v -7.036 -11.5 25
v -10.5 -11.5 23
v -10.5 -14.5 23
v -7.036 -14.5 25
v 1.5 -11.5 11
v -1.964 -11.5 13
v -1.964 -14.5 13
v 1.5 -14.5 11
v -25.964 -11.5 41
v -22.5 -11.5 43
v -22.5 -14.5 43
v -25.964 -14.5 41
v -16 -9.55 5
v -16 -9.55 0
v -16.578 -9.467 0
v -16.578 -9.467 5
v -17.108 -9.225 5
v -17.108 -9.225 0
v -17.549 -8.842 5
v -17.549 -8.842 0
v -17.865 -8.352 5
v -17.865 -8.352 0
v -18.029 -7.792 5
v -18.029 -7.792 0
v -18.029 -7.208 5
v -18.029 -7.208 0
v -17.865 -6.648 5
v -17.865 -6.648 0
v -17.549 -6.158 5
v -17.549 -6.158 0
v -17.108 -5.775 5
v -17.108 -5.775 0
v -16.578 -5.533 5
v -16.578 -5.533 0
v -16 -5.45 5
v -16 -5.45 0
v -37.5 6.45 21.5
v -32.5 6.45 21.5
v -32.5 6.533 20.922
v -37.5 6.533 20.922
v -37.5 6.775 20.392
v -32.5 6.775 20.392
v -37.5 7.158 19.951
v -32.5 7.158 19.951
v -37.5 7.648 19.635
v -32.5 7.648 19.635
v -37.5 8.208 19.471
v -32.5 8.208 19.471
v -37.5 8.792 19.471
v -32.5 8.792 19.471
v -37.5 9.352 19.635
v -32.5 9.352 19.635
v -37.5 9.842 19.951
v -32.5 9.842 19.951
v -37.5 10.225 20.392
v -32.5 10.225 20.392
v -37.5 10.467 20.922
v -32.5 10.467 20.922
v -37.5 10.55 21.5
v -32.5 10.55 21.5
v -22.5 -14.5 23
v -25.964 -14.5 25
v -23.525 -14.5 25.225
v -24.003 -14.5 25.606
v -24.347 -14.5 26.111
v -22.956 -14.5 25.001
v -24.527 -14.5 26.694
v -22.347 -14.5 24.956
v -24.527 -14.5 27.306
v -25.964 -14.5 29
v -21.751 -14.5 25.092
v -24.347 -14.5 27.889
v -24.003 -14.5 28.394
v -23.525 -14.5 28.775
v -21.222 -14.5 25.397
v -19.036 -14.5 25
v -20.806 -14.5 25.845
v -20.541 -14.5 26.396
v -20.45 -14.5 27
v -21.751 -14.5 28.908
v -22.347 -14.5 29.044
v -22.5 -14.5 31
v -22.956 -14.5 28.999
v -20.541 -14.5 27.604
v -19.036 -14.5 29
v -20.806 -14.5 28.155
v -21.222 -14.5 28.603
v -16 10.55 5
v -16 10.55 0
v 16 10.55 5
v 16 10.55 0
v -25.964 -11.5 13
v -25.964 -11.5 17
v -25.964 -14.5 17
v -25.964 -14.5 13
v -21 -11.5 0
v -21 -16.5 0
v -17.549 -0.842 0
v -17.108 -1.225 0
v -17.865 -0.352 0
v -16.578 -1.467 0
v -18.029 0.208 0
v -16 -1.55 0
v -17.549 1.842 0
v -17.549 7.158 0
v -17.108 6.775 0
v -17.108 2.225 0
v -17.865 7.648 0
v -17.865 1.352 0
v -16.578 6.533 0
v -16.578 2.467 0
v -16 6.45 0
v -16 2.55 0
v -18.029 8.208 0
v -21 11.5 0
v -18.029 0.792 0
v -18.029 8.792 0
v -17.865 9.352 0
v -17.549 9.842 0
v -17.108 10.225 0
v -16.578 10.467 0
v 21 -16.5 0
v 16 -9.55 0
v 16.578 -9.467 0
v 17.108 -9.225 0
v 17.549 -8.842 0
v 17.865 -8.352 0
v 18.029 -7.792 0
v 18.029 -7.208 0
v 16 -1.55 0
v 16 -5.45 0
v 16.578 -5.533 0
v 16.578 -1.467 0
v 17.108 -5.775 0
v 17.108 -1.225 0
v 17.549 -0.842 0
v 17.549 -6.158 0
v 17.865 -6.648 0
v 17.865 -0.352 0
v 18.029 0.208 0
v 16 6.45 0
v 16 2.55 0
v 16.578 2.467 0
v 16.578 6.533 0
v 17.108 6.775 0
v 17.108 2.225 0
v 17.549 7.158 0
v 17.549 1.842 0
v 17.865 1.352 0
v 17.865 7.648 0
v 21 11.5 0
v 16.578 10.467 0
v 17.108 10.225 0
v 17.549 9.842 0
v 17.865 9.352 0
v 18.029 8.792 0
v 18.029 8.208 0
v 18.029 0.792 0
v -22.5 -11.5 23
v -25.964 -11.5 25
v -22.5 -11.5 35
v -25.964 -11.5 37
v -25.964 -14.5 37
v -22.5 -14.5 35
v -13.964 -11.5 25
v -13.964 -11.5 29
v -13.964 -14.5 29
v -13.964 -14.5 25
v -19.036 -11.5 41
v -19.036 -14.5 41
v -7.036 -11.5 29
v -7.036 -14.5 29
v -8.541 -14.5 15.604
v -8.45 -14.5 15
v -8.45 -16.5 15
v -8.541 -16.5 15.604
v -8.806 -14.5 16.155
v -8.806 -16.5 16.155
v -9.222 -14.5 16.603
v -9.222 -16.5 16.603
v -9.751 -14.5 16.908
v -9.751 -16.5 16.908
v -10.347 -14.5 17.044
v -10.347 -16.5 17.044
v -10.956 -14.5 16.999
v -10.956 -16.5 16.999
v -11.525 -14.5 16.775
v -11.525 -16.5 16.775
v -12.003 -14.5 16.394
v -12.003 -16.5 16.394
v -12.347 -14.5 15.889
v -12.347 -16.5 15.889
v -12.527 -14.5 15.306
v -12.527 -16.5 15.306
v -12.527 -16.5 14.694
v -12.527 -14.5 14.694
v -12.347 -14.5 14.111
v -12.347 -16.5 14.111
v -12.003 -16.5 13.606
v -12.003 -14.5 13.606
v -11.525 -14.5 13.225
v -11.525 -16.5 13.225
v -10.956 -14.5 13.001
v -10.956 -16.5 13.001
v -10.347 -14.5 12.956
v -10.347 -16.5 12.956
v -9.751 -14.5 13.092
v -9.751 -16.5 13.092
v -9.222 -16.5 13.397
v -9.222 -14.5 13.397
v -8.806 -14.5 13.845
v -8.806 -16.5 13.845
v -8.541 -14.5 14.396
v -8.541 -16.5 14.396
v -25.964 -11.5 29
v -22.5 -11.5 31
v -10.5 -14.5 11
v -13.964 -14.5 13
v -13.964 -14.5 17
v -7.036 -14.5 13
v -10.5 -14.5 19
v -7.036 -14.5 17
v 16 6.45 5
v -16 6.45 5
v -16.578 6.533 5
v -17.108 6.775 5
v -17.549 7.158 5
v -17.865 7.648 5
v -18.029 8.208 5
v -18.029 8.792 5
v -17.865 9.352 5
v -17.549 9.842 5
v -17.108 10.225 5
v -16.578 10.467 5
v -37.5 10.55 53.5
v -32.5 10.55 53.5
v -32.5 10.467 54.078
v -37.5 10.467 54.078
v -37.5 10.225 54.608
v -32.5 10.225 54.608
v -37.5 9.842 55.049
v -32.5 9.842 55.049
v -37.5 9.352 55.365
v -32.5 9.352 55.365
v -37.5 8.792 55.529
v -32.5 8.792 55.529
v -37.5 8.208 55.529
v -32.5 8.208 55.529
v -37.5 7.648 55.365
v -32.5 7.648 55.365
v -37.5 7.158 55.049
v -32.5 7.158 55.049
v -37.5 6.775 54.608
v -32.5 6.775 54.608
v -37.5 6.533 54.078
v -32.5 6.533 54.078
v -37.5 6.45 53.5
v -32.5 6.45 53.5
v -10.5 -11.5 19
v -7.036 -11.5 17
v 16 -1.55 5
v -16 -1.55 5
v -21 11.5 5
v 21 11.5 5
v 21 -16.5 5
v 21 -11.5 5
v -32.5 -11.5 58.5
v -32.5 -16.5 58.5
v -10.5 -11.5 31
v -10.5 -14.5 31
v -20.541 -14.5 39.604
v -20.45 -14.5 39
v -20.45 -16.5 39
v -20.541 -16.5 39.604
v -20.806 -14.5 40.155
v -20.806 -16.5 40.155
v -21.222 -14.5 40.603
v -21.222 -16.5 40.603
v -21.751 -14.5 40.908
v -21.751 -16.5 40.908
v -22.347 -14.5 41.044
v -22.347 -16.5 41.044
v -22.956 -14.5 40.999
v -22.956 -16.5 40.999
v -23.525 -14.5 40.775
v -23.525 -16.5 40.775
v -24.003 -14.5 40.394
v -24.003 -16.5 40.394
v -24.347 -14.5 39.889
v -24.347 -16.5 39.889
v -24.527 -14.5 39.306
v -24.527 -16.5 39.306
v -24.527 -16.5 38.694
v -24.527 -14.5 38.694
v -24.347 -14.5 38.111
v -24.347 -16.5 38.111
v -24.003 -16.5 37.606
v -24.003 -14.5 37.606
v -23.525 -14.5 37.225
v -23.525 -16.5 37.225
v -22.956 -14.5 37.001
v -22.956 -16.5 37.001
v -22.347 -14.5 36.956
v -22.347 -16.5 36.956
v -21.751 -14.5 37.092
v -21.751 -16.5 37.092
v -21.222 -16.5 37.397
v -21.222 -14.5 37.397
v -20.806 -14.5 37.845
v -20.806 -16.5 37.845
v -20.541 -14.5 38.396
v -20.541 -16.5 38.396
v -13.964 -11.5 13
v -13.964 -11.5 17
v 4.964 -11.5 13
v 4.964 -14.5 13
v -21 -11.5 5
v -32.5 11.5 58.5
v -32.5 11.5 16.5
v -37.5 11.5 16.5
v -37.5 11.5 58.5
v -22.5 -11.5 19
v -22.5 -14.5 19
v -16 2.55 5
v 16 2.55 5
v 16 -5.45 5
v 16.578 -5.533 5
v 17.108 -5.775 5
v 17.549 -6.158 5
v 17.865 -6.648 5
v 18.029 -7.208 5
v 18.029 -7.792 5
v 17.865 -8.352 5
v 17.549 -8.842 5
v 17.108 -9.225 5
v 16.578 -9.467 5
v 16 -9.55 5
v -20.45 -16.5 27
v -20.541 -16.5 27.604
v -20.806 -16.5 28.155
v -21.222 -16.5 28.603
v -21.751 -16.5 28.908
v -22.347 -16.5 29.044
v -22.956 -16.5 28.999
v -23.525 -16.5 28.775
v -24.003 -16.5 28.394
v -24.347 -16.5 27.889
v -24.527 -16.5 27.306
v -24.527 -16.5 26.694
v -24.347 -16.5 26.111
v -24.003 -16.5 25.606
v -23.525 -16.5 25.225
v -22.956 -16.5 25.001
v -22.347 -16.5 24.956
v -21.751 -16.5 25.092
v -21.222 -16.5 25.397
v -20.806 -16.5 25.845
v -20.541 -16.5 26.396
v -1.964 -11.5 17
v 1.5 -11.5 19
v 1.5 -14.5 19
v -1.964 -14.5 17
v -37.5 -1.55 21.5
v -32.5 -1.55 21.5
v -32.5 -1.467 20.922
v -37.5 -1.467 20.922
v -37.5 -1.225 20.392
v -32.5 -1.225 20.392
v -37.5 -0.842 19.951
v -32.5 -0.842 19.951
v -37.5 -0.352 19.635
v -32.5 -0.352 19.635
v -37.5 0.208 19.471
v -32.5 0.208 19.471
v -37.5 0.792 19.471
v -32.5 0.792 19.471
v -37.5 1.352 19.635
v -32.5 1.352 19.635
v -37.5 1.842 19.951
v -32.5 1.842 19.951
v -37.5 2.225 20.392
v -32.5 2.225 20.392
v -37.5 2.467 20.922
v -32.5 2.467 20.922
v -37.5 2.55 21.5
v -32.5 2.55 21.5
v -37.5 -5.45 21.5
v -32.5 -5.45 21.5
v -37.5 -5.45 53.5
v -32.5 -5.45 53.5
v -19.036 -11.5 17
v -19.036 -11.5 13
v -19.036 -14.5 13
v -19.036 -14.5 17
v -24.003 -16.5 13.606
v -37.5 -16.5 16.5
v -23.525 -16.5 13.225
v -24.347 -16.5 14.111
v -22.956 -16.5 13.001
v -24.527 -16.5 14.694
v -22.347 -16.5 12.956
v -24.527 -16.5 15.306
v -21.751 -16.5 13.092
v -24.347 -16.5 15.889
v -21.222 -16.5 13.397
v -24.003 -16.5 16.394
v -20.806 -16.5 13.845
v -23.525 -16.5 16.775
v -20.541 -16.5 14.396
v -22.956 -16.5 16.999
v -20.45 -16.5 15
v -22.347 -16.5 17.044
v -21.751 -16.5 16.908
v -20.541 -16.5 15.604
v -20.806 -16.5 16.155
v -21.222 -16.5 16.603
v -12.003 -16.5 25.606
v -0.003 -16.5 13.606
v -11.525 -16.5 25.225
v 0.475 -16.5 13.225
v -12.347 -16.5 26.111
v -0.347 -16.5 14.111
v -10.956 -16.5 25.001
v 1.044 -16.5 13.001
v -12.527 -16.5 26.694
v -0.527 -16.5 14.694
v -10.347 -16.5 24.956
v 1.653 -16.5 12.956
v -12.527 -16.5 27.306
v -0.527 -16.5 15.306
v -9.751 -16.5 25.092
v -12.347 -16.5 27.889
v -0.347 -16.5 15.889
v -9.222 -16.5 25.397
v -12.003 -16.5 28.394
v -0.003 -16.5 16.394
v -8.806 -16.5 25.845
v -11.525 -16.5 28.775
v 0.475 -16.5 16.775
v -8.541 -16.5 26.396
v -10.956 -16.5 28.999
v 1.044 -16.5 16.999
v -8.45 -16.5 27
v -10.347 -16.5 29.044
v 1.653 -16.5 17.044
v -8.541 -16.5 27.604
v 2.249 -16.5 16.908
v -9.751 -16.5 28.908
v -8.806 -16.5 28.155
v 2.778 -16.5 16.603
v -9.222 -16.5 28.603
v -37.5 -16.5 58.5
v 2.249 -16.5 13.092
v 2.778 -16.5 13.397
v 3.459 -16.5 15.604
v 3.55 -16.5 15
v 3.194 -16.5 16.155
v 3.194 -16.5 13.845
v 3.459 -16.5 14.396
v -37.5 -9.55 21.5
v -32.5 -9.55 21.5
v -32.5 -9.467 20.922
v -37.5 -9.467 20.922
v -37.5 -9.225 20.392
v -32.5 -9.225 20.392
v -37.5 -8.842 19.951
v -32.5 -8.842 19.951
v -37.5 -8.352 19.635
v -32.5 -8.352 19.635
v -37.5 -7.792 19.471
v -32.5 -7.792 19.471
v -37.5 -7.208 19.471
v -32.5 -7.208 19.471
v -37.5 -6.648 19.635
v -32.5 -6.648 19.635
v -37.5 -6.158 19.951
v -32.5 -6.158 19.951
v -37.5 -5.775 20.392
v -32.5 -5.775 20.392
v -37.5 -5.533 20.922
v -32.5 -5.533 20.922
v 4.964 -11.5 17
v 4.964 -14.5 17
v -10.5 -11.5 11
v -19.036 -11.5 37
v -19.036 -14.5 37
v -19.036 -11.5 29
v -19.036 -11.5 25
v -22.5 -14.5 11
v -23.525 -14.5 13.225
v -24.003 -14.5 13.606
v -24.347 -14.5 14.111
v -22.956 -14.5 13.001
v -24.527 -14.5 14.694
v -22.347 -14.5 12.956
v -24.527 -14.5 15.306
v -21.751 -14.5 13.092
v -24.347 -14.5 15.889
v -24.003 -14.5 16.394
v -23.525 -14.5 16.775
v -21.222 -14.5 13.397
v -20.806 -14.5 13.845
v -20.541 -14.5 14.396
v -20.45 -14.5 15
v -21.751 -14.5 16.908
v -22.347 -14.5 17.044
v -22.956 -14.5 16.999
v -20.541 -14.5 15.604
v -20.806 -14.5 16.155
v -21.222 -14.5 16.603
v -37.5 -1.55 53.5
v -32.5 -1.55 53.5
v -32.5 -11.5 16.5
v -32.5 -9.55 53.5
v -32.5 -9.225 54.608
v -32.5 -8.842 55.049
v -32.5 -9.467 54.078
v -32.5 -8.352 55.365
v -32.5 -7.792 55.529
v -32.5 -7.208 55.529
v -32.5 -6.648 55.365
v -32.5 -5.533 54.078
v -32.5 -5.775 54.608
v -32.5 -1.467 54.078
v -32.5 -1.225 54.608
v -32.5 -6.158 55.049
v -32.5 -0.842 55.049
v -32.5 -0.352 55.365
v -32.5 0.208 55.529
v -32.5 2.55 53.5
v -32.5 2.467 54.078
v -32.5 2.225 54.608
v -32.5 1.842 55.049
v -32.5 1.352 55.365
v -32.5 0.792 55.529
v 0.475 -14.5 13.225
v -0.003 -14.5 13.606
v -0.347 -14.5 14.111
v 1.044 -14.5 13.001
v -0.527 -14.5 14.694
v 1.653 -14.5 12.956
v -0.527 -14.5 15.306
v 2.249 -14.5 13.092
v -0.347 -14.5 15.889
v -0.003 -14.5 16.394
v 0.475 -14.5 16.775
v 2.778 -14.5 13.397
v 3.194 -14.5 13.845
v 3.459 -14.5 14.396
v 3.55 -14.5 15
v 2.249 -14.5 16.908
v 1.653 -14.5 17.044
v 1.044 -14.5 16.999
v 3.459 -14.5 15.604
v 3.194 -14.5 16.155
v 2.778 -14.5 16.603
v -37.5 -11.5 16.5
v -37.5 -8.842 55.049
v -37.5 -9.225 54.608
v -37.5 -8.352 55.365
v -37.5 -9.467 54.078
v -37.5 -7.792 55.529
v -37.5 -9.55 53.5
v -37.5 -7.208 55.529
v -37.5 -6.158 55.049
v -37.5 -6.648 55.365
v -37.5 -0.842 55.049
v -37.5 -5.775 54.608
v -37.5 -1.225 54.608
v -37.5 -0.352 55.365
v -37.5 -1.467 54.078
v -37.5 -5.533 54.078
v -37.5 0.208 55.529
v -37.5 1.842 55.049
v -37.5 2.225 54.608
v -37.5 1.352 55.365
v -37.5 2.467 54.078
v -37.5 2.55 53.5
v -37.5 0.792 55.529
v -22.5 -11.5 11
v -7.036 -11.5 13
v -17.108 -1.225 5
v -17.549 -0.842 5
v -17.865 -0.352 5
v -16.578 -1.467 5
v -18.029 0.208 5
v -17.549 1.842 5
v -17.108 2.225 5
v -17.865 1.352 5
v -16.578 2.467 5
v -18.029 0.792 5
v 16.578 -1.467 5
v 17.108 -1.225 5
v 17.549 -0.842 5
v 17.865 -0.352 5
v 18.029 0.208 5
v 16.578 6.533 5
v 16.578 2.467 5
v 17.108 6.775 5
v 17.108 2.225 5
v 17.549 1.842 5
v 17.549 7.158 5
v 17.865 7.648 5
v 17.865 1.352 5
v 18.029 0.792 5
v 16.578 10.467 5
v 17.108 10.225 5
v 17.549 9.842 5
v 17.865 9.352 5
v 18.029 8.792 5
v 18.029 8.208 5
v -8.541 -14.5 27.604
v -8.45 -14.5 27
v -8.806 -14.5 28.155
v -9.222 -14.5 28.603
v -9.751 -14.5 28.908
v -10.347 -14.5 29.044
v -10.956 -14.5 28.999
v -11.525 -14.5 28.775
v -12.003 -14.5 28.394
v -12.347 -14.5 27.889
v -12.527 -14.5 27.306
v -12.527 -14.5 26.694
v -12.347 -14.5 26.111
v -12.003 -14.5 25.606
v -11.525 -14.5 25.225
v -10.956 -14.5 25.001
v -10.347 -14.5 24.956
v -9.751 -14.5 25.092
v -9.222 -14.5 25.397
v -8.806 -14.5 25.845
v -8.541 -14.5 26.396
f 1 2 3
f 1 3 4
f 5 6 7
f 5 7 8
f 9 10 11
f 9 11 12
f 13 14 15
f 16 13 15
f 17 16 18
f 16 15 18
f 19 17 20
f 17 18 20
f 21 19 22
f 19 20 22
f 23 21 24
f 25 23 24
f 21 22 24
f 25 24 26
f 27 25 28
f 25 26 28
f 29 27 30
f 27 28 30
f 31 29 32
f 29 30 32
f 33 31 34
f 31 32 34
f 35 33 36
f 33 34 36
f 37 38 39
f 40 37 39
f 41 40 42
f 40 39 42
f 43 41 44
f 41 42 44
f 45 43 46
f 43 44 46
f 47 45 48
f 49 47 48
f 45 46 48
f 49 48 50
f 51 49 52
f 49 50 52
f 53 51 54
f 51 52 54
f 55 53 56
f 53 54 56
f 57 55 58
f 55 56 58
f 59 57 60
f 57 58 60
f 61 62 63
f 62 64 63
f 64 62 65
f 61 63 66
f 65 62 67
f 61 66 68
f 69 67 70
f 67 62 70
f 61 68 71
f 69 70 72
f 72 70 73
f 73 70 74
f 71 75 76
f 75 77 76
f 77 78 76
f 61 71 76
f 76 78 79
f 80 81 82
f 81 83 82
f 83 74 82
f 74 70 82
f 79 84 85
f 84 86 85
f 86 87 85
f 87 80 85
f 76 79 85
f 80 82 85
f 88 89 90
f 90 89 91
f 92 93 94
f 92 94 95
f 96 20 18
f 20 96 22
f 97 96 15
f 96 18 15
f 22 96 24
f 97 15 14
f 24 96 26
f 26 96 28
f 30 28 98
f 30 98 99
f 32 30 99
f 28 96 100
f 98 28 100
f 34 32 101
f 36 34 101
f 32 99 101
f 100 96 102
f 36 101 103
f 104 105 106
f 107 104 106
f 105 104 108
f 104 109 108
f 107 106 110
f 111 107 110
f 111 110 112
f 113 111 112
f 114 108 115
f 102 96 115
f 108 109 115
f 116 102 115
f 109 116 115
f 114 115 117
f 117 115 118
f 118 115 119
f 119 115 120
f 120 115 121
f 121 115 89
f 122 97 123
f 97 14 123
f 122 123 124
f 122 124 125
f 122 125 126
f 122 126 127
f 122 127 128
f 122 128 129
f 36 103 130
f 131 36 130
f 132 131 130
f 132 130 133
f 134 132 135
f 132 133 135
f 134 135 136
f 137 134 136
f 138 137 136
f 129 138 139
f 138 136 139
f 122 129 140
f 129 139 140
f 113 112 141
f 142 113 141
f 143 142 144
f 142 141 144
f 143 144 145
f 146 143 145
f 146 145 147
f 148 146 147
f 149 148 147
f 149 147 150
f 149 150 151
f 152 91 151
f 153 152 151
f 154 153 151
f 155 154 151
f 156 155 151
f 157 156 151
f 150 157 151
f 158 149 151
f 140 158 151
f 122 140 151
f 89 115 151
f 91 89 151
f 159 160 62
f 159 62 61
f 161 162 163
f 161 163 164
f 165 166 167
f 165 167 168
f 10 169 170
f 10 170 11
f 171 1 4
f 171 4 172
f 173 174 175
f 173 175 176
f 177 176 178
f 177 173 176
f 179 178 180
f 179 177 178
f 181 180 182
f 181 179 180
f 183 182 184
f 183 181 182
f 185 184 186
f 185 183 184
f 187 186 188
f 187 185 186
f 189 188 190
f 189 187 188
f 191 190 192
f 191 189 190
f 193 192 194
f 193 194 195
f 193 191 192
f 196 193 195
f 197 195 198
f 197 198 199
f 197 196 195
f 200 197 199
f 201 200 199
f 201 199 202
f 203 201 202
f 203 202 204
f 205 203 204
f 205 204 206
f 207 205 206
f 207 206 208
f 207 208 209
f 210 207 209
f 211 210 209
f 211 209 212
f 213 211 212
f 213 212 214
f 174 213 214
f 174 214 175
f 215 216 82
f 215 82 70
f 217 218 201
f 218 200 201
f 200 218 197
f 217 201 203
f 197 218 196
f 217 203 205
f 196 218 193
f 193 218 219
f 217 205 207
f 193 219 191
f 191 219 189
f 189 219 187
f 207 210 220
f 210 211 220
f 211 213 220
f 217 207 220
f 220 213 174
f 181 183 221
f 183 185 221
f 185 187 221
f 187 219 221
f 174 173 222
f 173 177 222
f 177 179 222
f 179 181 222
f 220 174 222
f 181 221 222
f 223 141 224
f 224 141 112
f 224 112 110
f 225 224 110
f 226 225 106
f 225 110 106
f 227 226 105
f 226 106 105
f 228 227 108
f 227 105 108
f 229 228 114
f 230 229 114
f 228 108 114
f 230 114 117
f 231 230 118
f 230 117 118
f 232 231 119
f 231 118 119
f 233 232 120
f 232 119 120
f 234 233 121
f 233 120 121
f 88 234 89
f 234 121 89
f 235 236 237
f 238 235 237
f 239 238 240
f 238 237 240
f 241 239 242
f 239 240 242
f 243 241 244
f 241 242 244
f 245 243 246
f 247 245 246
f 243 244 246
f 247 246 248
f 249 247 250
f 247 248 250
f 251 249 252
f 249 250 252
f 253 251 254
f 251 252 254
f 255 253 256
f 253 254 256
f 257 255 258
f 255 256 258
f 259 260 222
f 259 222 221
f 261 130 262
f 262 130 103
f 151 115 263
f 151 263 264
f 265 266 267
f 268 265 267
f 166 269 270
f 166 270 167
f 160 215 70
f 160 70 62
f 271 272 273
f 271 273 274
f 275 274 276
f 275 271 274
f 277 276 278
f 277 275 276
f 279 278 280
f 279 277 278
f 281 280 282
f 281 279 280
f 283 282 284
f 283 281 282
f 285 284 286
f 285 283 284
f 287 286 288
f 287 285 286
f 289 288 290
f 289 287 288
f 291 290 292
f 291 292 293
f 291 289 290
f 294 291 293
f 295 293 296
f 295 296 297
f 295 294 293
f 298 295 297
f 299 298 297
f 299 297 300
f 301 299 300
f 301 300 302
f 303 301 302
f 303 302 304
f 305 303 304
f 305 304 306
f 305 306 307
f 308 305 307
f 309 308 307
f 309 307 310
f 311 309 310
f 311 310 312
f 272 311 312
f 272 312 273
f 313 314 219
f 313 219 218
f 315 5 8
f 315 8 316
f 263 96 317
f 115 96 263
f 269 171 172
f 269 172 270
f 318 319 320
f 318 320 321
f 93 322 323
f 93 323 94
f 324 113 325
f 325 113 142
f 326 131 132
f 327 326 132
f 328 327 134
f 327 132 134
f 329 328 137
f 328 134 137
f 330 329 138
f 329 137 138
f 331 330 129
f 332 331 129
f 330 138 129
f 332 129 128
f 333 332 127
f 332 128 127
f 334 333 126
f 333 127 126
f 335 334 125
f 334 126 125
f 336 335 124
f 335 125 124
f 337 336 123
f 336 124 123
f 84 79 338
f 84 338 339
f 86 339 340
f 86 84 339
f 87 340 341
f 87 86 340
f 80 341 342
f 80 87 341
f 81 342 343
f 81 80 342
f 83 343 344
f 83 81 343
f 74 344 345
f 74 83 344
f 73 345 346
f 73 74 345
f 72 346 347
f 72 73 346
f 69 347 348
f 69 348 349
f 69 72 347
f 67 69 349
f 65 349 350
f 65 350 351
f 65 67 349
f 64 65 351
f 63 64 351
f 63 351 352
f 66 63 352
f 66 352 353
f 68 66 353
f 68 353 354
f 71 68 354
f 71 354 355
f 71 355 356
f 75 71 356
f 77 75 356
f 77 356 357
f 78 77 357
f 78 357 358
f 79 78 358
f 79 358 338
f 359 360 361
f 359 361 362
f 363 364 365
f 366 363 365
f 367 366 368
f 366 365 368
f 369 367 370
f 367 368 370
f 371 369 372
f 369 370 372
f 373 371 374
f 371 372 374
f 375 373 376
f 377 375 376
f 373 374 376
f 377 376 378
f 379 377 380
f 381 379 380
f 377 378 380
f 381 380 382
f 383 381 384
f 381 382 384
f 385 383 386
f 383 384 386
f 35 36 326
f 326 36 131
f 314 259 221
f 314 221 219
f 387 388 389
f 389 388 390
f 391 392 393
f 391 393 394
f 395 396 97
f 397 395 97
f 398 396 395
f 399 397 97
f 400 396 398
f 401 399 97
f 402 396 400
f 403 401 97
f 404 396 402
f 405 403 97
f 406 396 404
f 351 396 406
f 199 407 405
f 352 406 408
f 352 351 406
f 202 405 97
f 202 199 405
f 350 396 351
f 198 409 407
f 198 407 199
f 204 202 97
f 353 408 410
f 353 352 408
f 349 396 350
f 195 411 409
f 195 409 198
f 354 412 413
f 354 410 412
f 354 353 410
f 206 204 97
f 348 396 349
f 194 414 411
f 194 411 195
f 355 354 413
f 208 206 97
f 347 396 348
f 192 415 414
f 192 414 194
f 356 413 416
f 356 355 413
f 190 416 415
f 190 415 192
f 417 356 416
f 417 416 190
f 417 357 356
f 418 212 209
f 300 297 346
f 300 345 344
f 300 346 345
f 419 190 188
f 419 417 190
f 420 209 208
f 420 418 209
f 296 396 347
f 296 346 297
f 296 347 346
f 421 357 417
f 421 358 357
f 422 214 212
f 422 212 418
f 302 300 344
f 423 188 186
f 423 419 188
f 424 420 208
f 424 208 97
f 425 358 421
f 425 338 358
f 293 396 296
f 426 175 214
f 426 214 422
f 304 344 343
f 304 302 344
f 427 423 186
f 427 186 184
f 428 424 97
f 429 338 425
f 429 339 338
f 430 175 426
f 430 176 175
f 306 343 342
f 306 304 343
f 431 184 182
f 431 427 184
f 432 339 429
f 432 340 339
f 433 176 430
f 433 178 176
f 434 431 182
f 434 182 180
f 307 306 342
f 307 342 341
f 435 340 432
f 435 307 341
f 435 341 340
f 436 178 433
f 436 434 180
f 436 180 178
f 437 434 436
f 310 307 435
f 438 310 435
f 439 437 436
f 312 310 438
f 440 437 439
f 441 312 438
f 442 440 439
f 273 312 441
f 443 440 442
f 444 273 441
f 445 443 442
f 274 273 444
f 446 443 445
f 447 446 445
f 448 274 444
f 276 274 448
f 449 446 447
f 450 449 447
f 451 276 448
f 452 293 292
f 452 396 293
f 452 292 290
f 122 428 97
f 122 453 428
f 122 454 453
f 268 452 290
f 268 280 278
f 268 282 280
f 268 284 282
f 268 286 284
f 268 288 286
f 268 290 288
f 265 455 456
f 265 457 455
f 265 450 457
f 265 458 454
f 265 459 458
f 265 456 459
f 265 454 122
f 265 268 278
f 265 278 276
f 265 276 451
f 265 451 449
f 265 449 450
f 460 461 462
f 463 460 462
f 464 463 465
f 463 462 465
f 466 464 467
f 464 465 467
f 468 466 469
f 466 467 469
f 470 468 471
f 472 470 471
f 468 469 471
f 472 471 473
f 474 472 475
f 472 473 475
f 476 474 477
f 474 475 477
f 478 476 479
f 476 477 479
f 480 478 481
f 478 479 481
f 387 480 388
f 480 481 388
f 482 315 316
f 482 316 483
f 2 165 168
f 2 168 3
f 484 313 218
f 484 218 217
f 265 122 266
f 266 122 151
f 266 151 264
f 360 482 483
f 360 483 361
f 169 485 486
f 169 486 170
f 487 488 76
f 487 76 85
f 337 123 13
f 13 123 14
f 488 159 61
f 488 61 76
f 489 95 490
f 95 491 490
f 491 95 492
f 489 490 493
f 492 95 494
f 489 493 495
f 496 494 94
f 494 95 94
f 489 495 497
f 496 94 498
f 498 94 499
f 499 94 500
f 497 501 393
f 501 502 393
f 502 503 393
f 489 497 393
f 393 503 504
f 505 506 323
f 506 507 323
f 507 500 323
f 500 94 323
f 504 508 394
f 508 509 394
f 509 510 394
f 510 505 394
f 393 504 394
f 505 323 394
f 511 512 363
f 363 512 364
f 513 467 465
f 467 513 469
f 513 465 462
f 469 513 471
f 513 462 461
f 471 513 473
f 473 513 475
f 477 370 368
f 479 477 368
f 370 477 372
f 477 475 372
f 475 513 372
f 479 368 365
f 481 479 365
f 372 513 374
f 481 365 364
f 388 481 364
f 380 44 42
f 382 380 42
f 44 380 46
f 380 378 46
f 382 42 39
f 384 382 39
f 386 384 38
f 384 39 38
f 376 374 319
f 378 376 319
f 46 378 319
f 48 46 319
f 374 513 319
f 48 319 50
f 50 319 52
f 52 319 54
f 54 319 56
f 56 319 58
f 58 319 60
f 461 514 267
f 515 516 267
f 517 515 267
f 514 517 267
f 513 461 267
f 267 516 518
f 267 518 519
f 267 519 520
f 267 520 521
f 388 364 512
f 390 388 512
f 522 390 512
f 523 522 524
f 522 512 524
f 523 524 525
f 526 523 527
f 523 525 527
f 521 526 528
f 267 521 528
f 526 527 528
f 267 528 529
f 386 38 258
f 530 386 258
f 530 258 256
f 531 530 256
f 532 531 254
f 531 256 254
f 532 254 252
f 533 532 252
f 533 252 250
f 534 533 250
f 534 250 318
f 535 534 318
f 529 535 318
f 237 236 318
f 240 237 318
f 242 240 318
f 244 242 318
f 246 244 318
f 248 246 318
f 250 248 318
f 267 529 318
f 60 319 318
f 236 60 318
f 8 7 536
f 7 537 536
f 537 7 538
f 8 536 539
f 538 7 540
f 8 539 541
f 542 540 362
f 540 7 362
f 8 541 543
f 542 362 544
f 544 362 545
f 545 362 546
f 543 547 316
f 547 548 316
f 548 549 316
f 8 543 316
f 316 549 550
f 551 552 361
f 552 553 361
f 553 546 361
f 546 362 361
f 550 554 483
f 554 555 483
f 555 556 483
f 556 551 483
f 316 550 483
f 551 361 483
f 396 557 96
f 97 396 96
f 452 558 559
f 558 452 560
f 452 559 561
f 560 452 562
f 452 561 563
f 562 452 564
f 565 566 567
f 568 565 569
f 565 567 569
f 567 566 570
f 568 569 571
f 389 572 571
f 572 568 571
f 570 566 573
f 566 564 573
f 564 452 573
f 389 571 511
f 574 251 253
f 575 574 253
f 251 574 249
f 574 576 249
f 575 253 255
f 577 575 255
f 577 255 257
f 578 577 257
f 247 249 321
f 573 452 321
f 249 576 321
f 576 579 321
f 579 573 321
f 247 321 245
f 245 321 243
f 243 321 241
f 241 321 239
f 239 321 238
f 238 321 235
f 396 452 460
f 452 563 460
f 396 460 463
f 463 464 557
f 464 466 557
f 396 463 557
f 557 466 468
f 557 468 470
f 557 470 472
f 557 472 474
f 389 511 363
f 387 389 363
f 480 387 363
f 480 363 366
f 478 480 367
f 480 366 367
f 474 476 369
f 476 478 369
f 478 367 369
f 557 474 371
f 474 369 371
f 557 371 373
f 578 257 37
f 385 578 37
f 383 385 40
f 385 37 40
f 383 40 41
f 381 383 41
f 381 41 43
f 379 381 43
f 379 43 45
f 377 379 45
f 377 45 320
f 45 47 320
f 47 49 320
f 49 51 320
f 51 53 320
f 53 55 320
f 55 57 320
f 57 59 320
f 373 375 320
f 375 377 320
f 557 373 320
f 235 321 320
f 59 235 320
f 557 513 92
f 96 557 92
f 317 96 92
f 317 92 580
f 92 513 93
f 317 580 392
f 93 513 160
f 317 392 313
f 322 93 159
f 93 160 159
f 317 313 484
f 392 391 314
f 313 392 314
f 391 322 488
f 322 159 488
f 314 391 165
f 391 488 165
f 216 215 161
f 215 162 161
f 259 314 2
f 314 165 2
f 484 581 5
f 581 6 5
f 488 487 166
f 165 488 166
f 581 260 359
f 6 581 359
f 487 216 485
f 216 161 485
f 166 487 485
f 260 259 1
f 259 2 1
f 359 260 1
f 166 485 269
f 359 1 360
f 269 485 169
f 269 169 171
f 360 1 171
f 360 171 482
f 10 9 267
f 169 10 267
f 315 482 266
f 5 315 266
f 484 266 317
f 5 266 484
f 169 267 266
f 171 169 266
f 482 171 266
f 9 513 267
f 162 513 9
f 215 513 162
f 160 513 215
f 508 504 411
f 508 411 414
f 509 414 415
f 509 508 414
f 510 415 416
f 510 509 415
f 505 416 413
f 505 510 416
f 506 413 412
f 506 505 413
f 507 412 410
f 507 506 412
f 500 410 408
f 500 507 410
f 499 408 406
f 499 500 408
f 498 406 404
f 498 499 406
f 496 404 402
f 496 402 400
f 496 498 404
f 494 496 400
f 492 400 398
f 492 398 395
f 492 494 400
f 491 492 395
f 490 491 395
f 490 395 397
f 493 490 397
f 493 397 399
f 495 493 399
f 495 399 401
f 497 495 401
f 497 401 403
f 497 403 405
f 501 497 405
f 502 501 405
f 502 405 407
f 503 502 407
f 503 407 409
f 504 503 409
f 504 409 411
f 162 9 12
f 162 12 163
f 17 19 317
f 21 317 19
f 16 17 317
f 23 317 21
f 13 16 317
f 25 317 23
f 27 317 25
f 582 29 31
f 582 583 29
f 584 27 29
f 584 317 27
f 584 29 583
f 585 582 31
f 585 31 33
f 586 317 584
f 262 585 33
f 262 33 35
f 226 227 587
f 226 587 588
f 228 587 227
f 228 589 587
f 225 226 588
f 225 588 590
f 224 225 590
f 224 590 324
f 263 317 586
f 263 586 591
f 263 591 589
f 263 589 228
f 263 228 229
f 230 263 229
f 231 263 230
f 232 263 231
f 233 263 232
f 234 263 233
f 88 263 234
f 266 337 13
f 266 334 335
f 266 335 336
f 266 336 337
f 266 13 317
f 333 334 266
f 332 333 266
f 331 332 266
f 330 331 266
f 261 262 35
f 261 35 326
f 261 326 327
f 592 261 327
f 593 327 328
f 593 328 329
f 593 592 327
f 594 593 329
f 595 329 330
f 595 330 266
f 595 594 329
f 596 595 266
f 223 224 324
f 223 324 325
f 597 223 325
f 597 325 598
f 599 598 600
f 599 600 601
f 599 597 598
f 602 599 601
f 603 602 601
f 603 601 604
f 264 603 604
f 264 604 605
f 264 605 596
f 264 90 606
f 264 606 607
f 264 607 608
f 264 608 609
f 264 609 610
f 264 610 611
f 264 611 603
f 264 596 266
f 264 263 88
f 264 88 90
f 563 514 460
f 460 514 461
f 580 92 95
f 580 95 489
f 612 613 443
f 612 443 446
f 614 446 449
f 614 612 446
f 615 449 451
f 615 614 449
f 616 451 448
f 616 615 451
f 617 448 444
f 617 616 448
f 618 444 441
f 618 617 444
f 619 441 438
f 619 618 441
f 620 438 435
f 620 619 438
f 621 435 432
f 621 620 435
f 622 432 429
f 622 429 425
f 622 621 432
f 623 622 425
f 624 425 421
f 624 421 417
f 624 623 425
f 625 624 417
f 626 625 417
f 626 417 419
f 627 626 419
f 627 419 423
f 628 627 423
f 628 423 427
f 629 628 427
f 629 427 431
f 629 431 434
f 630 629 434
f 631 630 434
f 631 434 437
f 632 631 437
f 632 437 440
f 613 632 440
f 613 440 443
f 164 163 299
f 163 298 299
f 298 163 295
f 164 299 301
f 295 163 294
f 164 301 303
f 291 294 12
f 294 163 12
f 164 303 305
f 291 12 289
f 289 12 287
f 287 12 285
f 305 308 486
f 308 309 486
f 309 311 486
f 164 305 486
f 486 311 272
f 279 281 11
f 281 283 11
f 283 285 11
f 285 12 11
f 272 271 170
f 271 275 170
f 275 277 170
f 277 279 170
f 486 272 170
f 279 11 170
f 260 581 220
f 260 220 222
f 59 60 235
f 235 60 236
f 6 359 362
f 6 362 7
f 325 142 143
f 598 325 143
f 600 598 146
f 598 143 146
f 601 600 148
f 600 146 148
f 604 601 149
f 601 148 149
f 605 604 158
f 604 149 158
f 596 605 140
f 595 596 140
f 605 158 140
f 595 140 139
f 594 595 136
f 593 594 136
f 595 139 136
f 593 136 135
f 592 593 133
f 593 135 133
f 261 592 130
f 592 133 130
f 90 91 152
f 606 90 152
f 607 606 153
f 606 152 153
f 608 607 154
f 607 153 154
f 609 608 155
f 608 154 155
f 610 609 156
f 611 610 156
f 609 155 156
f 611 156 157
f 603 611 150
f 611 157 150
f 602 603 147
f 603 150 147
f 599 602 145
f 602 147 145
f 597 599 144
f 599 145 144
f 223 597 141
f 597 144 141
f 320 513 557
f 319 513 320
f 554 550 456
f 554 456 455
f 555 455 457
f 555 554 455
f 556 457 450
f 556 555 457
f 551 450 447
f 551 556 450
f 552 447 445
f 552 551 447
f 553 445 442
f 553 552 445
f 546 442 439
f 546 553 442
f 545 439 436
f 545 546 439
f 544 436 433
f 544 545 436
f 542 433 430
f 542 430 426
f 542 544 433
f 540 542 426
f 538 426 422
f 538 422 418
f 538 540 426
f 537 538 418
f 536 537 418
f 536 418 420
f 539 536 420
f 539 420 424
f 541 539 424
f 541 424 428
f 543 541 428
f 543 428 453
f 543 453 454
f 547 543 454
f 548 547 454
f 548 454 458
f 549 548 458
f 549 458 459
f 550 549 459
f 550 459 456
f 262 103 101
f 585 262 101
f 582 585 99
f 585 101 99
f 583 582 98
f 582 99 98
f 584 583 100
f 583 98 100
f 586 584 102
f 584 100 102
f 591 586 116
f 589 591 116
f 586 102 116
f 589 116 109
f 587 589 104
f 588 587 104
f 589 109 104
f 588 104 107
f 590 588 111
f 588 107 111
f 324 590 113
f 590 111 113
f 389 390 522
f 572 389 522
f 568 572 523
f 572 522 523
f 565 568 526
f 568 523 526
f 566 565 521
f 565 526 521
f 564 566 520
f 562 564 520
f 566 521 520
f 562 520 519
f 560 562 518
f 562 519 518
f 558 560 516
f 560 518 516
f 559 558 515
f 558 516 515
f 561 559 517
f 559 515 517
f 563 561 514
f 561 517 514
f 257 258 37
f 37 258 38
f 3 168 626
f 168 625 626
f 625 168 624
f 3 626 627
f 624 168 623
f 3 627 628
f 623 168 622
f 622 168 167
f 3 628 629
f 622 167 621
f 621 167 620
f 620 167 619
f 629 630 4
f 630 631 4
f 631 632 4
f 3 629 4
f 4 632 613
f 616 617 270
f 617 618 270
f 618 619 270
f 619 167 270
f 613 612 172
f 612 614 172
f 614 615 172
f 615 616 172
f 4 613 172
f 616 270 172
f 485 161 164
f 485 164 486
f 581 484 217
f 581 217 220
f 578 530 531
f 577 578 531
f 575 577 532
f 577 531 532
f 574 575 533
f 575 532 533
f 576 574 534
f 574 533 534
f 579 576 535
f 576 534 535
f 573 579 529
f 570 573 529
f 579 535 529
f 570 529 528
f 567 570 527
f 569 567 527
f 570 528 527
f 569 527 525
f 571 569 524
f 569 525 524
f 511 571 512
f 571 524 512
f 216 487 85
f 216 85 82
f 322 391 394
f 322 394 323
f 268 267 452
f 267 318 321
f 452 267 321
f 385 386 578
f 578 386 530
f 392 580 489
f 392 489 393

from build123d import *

# Parameters (mm, degrees)
F0_W      = 42
F0_H      = 23
F1_DEPTH  = 5
F3_ANGLE  = 90
F8_R      = 2.05
F9_DEPTH  = 5
F10_DEPTH = 3


# Not quite as in the source:
# - a feature names something its author has since deleted; it is built from what else it names


with BuildPart() as f1:
    # F0 (on Top) → F1 (new body)
    with BuildSketch(Plane.XY):
        Rectangle(F0_W, F0_H)
        with BuildLine():
            ThreePointArc((-16, -9.55), (-18.05, -7.5), (-16, -5.45))
            Line((-16, -5.45), (16, -5.45))
            ThreePointArc((16, -5.45), (18.05, -7.5), (16, -9.55))
            Line((16, -9.55), (-16, -9.55))
        make_face(mode=Mode.SUBTRACT)
        with BuildLine():
            Line((0, -1.55), (-16, -1.55))
            ThreePointArc((-16, -1.55), (-18.05, 0.5), (-16, 2.55))
            Line((-16, 2.55), (0, 2.55))
            Line((0, 2.55), (16, 2.55))
            ThreePointArc((16, 2.55), (18.05, 0.5), (16, -1.55))
            Line((16, -1.55), (0, -1.55))
        make_face(mode=Mode.SUBTRACT)
        with BuildLine():
            Line((16, 6.45), (-16, 6.45))
            ThreePointArc((-16, 6.45), (-18.05, 8.5), (-16, 10.55))
            Line((-16, 10.55), (16, 10.55))
            ThreePointArc((16, 10.55), (18.05, 8.5), (16, 6.45))
        make_face(mode=Mode.SUBTRACT)
    extrude(amount=F1_DEPTH)


with BuildPart() as f3_1:
    # F3: copy of F1
    add(f1.part.rotate(Axis((-21, 0, 2.5), (0, -1, 0)), F3_ANGLE))


with BuildPart() as f3_1_1:
    # F4: moved
    add(f3_1.part.moved(Location((0, 0, 14))))


with BuildPart() as f3_1_2:
    # F5: moved
    add(f3_1_1.part.moved(Location((-14, 0, 0))))


with BuildPart() as f1_1:
    add(f1.part)

    add(f3_1_2.part)  # F9 merges F3_1
    # F8 (on 3pt) → F9 (join)
    with BuildSketch(Plane.XZ.offset(11.5)):
        Polygon((-37.5, 16.5), (-21, 0), (21, 0), (21, 5), (14.4509618943, 11.5490381057), (13.5, 11), (10.0358983849, 13), (10.0358983849, 15.9641016151), (2.4509618943, 23.5490381057), (1.5, 23), (-1.9641016151, 25), (-1.9641016151, 27.9641016151), (-9.5490381057, 35.5490381057), (-10.5, 35), (-13.9641016151, 37), (-13.9641016151, 39.9641016151), (-21.5490381057, 47.5490381057), (-22.5, 47), (-25.9641016151, 49), (-25.9641016151, 51.9641016151), (-32.5, 58.5), (-37.5, 58.5), align=None)
        Polygon((-25.9641016151, 17), (-22.5, 19), (-19.0358983849, 17), (-19.0358983849, 13), (-22.5, 11), (-25.9641016151, 13), align=None, mode=Mode.SUBTRACT)
        Polygon((-13.9641016151, 13), (-13.9641016151, 17), (-10.5, 19), (-7.0358983849, 17), (-7.0358983849, 13), (-10.5, 11), align=None, mode=Mode.SUBTRACT)
        Polygon((-25.9641016151, 25), (-25.9641016151, 29), (-22.5, 31), (-19.0358983849, 29), (-19.0358983849, 25), (-22.5, 23), align=None, mode=Mode.SUBTRACT)
        Polygon((-13.9641016151, 25), (-13.9641016151, 29), (-10.5, 31), (-7.0358983849, 29), (-7.0358983849, 25), (-10.5, 23), align=None, mode=Mode.SUBTRACT)
        Polygon((-1.9641016151, 13), (-1.9641016151, 17), (1.5, 19), (4.9641016151, 17), (4.9641016151, 13), (1.5, 11), align=None, mode=Mode.SUBTRACT)
        Polygon((-25.9641016151, 37), (-25.9641016151, 41), (-22.5, 43), (-19.0358983849, 41), (-19.0358983849, 37), (-22.5, 35), align=None, mode=Mode.SUBTRACT)
        with BuildLine():
            Line((13.5, 11), (14.4509618943, 11.5490381057))
            Line((14.4509618943, 11.5490381057), (12.9839959128, 13.0160040872))
            ThreePointArc((12.9839959128, 13.0160040872), (12.0504310986, 13.5504310986), (11.5160040872, 14.4839959128))
            Line((11.5160040872, 14.4839959128), (10.0358983849, 15.9641016151))
            Line((10.0358983849, 15.9641016151), (10.0358983849, 13))
            Line((10.0358983849, 13), (13.5, 11))
        make_face()
        with BuildLine():
            Line((-24.4839959128, 50.4839959128), (-25.9641016151, 51.9641016151))
            Line((-25.9641016151, 51.9641016151), (-25.9641016151, 49))
            Line((-25.9641016151, 49), (-22.5, 47))
            Line((-22.5, 47), (-21.5490381057, 47.5490381057))
            Line((-21.5490381057, 47.5490381057), (-23.0160040872, 49.0160040872))
            ThreePointArc((-23.0160040872, 49.0160040872), (-23.9495689014, 49.5504310986), (-24.4839959128, 50.4839959128))
        make_face()
        with BuildLine():
            ThreePointArc((11.5160040872, 14.4839959128), (12.0504310986, 13.5504310986), (12.9839959128, 13.0160040872))
            Line((12.9839959128, 13.0160040872), (11.5160040872, 14.4839959128))
        make_face()
        with BuildLine():
            Line((-23.0160040872, 49.0160040872), (-24.4839959128, 50.4839959128))
            ThreePointArc((-24.4839959128, 50.4839959128), (-23.9495689014, 49.5504310986), (-23.0160040872, 49.0160040872))
        make_face()
        with BuildLine():
            Line((1.5, 23), (2.4509618943, 23.5490381057))
            Line((2.4509618943, 23.5490381057), (0.9839959128, 25.0160040872))
            ThreePointArc((0.9839959128, 25.0160040872), (0.0504310986, 25.5504310986), (-0.4839959128, 26.4839959128))
            Line((-0.4839959128, 26.4839959128), (-1.9641016151, 27.9641016151))
            Line((-1.9641016151, 27.9641016151), (-1.9641016151, 25))
            Line((-1.9641016151, 25), (1.5, 23))
        make_face()
        with BuildLine():
            Line((-12.4839959128, 38.4839959128), (-13.9641016151, 39.9641016151))
            Line((-13.9641016151, 39.9641016151), (-13.9641016151, 37))
            Line((-13.9641016151, 37), (-10.5, 35))
            Line((-10.5, 35), (-9.5490381057, 35.5490381057))
            Line((-9.5490381057, 35.5490381057), (-11.0160040872, 37.0160040872))
            ThreePointArc((-11.0160040872, 37.0160040872), (-11.9495689014, 37.5504310986), (-12.4839959128, 38.4839959128))
        make_face()
        with BuildLine():
            ThreePointArc((-0.4839959128, 26.4839959128), (0.0504310986, 25.5504310986), (0.9839959128, 25.0160040872))
            Line((0.9839959128, 25.0160040872), (-0.4839959128, 26.4839959128))
        make_face()
        with BuildLine():
            Line((-11.0160040872, 37.0160040872), (-12.4839959128, 38.4839959128))
            ThreePointArc((-12.4839959128, 38.4839959128), (-11.9495689014, 37.5504310986), (-11.0160040872, 37.0160040872))
        make_face()
        Polygon((-10.5, 31), (-13.9641016151, 29), (-13.9641016151, 25), (-10.5, 23), (-7.0358983849, 25), (-7.0358983849, 29), align=None)
        with Locations((-10.5, 27)):
            Circle(F8_R, mode=Mode.SUBTRACT)
        Polygon((-22.5, 31), (-25.9641016151, 29), (-25.9641016151, 25), (-22.5, 23), (-19.0358983849, 25), (-19.0358983849, 29), align=None)
        with Locations((-22.5, 27)):
            Circle(F8_R, mode=Mode.SUBTRACT)
        Polygon((-22.5, 43), (-25.9641016151, 41), (-25.9641016151, 37), (-22.5, 35), (-19.0358983849, 37), (-19.0358983849, 41), align=None)
        with Locations((-22.5, 39)):
            Circle(F8_R, mode=Mode.SUBTRACT)
        Polygon((-10.5, 19), (-13.9641016151, 17), (-13.9641016151, 13), (-10.5, 11), (-7.0358983849, 13), (-7.0358983849, 17), align=None)
        with Locations((-10.5, 15)):
            Circle(F8_R, mode=Mode.SUBTRACT)
        Polygon((1.5, 19), (-1.9641016151, 17), (-1.9641016151, 13), (1.5, 11), (4.9641016151, 13), (4.9641016151, 17), align=None)
        with Locations((1.5, 15)):
            Circle(F8_R, mode=Mode.SUBTRACT)
        Polygon((-19.0358983849, 17), (-22.5, 19), (-25.9641016151, 17), (-25.9641016151, 13), (-22.5, 11), (-19.0358983849, 13), align=None)
        with Locations((-22.5, 15)):
            Circle(F8_R, mode=Mode.SUBTRACT)
    extrude(amount=F9_DEPTH)

    # F8 (on 3pt) → F10 (cut)
    with BuildSketch(Plane.XZ.offset(11.5)):
        Polygon((-10.5, 31), (-13.9641016151, 29), (-13.9641016151, 25), (-10.5, 23), (-7.0358983849, 25), (-7.0358983849, 29), align=None)
        with Locations((-10.5, 27)):
            Circle(F8_R, mode=Mode.SUBTRACT)
        Polygon((-22.5, 31), (-25.9641016151, 29), (-25.9641016151, 25), (-22.5, 23), (-19.0358983849, 25), (-19.0358983849, 29), align=None)
        with Locations((-22.5, 27)):
            Circle(F8_R, mode=Mode.SUBTRACT)
        Polygon((-22.5, 43), (-25.9641016151, 41), (-25.9641016151, 37), (-22.5, 35), (-19.0358983849, 37), (-19.0358983849, 41), align=None)
        with Locations((-22.5, 39)):
            Circle(F8_R, mode=Mode.SUBTRACT)
        Polygon((-10.5, 19), (-13.9641016151, 17), (-13.9641016151, 13), (-10.5, 11), (-7.0358983849, 13), (-7.0358983849, 17), align=None)
        with Locations((-10.5, 15)):
            Circle(F8_R, mode=Mode.SUBTRACT)
        Polygon((1.5, 19), (-1.9641016151, 17), (-1.9641016151, 13), (1.5, 11), (4.9641016151, 13), (4.9641016151, 17), align=None)
        with Locations((1.5, 15)):
            Circle(F8_R, mode=Mode.SUBTRACT)
        with BuildLine():
            Line((0.9839959128, 25.0160040872), (2.4509618943, 23.5490381057))
            Line((2.4509618943, 23.5490381057), (4.9641016151, 25))
            Line((4.9641016151, 25), (4.9641016151, 29))
            Line((4.9641016151, 29), (1.5, 31))
            Line((1.5, 31), (-1.9641016151, 29))
            Line((-1.9641016151, 29), (-1.9641016151, 27.9641016151))
            Line((-1.9641016151, 27.9641016151), (-0.4839959128, 26.4839959128))
            ThreePointArc((-0.4839959128, 26.4839959128), (1.2398958105, 29.0334320275), (3.55, 27))
            ThreePointArc((3.55, 27), (2.7539321396, 25.3782249881), (0.9839959128, 25.0160040872))
        make_face()
        with BuildLine():
            Line((12.9839959128, 13.0160040872), (14.4509618943, 11.5490381057))
            Line((14.4509618943, 11.5490381057), (16.9641016151, 13))
            Line((16.9641016151, 13), (16.9641016151, 17))
            Line((16.9641016151, 17), (13.5, 19))
            Line((13.5, 19), (10.0358983849, 17))
            Line((10.0358983849, 17), (10.0358983849, 15.9641016151))
            Line((10.0358983849, 15.9641016151), (11.5160040872, 14.4839959128))
            ThreePointArc((11.5160040872, 14.4839959128), (13.2398958105, 17.0334320275), (15.55, 15))
            ThreePointArc((15.55, 15), (14.7539321396, 13.3782249881), (12.9839959128, 13.0160040872))
        make_face()
        Polygon((-19.0358983849, 17), (-22.5, 19), (-25.9641016151, 17), (-25.9641016151, 13), (-22.5, 11), (-19.0358983849, 13), align=None)
        with Locations((-22.5, 15)):
            Circle(F8_R, mode=Mode.SUBTRACT)
    extrude(amount=F10_DEPTH, mode=Mode.SUBTRACT)


solid = f1_1.part
